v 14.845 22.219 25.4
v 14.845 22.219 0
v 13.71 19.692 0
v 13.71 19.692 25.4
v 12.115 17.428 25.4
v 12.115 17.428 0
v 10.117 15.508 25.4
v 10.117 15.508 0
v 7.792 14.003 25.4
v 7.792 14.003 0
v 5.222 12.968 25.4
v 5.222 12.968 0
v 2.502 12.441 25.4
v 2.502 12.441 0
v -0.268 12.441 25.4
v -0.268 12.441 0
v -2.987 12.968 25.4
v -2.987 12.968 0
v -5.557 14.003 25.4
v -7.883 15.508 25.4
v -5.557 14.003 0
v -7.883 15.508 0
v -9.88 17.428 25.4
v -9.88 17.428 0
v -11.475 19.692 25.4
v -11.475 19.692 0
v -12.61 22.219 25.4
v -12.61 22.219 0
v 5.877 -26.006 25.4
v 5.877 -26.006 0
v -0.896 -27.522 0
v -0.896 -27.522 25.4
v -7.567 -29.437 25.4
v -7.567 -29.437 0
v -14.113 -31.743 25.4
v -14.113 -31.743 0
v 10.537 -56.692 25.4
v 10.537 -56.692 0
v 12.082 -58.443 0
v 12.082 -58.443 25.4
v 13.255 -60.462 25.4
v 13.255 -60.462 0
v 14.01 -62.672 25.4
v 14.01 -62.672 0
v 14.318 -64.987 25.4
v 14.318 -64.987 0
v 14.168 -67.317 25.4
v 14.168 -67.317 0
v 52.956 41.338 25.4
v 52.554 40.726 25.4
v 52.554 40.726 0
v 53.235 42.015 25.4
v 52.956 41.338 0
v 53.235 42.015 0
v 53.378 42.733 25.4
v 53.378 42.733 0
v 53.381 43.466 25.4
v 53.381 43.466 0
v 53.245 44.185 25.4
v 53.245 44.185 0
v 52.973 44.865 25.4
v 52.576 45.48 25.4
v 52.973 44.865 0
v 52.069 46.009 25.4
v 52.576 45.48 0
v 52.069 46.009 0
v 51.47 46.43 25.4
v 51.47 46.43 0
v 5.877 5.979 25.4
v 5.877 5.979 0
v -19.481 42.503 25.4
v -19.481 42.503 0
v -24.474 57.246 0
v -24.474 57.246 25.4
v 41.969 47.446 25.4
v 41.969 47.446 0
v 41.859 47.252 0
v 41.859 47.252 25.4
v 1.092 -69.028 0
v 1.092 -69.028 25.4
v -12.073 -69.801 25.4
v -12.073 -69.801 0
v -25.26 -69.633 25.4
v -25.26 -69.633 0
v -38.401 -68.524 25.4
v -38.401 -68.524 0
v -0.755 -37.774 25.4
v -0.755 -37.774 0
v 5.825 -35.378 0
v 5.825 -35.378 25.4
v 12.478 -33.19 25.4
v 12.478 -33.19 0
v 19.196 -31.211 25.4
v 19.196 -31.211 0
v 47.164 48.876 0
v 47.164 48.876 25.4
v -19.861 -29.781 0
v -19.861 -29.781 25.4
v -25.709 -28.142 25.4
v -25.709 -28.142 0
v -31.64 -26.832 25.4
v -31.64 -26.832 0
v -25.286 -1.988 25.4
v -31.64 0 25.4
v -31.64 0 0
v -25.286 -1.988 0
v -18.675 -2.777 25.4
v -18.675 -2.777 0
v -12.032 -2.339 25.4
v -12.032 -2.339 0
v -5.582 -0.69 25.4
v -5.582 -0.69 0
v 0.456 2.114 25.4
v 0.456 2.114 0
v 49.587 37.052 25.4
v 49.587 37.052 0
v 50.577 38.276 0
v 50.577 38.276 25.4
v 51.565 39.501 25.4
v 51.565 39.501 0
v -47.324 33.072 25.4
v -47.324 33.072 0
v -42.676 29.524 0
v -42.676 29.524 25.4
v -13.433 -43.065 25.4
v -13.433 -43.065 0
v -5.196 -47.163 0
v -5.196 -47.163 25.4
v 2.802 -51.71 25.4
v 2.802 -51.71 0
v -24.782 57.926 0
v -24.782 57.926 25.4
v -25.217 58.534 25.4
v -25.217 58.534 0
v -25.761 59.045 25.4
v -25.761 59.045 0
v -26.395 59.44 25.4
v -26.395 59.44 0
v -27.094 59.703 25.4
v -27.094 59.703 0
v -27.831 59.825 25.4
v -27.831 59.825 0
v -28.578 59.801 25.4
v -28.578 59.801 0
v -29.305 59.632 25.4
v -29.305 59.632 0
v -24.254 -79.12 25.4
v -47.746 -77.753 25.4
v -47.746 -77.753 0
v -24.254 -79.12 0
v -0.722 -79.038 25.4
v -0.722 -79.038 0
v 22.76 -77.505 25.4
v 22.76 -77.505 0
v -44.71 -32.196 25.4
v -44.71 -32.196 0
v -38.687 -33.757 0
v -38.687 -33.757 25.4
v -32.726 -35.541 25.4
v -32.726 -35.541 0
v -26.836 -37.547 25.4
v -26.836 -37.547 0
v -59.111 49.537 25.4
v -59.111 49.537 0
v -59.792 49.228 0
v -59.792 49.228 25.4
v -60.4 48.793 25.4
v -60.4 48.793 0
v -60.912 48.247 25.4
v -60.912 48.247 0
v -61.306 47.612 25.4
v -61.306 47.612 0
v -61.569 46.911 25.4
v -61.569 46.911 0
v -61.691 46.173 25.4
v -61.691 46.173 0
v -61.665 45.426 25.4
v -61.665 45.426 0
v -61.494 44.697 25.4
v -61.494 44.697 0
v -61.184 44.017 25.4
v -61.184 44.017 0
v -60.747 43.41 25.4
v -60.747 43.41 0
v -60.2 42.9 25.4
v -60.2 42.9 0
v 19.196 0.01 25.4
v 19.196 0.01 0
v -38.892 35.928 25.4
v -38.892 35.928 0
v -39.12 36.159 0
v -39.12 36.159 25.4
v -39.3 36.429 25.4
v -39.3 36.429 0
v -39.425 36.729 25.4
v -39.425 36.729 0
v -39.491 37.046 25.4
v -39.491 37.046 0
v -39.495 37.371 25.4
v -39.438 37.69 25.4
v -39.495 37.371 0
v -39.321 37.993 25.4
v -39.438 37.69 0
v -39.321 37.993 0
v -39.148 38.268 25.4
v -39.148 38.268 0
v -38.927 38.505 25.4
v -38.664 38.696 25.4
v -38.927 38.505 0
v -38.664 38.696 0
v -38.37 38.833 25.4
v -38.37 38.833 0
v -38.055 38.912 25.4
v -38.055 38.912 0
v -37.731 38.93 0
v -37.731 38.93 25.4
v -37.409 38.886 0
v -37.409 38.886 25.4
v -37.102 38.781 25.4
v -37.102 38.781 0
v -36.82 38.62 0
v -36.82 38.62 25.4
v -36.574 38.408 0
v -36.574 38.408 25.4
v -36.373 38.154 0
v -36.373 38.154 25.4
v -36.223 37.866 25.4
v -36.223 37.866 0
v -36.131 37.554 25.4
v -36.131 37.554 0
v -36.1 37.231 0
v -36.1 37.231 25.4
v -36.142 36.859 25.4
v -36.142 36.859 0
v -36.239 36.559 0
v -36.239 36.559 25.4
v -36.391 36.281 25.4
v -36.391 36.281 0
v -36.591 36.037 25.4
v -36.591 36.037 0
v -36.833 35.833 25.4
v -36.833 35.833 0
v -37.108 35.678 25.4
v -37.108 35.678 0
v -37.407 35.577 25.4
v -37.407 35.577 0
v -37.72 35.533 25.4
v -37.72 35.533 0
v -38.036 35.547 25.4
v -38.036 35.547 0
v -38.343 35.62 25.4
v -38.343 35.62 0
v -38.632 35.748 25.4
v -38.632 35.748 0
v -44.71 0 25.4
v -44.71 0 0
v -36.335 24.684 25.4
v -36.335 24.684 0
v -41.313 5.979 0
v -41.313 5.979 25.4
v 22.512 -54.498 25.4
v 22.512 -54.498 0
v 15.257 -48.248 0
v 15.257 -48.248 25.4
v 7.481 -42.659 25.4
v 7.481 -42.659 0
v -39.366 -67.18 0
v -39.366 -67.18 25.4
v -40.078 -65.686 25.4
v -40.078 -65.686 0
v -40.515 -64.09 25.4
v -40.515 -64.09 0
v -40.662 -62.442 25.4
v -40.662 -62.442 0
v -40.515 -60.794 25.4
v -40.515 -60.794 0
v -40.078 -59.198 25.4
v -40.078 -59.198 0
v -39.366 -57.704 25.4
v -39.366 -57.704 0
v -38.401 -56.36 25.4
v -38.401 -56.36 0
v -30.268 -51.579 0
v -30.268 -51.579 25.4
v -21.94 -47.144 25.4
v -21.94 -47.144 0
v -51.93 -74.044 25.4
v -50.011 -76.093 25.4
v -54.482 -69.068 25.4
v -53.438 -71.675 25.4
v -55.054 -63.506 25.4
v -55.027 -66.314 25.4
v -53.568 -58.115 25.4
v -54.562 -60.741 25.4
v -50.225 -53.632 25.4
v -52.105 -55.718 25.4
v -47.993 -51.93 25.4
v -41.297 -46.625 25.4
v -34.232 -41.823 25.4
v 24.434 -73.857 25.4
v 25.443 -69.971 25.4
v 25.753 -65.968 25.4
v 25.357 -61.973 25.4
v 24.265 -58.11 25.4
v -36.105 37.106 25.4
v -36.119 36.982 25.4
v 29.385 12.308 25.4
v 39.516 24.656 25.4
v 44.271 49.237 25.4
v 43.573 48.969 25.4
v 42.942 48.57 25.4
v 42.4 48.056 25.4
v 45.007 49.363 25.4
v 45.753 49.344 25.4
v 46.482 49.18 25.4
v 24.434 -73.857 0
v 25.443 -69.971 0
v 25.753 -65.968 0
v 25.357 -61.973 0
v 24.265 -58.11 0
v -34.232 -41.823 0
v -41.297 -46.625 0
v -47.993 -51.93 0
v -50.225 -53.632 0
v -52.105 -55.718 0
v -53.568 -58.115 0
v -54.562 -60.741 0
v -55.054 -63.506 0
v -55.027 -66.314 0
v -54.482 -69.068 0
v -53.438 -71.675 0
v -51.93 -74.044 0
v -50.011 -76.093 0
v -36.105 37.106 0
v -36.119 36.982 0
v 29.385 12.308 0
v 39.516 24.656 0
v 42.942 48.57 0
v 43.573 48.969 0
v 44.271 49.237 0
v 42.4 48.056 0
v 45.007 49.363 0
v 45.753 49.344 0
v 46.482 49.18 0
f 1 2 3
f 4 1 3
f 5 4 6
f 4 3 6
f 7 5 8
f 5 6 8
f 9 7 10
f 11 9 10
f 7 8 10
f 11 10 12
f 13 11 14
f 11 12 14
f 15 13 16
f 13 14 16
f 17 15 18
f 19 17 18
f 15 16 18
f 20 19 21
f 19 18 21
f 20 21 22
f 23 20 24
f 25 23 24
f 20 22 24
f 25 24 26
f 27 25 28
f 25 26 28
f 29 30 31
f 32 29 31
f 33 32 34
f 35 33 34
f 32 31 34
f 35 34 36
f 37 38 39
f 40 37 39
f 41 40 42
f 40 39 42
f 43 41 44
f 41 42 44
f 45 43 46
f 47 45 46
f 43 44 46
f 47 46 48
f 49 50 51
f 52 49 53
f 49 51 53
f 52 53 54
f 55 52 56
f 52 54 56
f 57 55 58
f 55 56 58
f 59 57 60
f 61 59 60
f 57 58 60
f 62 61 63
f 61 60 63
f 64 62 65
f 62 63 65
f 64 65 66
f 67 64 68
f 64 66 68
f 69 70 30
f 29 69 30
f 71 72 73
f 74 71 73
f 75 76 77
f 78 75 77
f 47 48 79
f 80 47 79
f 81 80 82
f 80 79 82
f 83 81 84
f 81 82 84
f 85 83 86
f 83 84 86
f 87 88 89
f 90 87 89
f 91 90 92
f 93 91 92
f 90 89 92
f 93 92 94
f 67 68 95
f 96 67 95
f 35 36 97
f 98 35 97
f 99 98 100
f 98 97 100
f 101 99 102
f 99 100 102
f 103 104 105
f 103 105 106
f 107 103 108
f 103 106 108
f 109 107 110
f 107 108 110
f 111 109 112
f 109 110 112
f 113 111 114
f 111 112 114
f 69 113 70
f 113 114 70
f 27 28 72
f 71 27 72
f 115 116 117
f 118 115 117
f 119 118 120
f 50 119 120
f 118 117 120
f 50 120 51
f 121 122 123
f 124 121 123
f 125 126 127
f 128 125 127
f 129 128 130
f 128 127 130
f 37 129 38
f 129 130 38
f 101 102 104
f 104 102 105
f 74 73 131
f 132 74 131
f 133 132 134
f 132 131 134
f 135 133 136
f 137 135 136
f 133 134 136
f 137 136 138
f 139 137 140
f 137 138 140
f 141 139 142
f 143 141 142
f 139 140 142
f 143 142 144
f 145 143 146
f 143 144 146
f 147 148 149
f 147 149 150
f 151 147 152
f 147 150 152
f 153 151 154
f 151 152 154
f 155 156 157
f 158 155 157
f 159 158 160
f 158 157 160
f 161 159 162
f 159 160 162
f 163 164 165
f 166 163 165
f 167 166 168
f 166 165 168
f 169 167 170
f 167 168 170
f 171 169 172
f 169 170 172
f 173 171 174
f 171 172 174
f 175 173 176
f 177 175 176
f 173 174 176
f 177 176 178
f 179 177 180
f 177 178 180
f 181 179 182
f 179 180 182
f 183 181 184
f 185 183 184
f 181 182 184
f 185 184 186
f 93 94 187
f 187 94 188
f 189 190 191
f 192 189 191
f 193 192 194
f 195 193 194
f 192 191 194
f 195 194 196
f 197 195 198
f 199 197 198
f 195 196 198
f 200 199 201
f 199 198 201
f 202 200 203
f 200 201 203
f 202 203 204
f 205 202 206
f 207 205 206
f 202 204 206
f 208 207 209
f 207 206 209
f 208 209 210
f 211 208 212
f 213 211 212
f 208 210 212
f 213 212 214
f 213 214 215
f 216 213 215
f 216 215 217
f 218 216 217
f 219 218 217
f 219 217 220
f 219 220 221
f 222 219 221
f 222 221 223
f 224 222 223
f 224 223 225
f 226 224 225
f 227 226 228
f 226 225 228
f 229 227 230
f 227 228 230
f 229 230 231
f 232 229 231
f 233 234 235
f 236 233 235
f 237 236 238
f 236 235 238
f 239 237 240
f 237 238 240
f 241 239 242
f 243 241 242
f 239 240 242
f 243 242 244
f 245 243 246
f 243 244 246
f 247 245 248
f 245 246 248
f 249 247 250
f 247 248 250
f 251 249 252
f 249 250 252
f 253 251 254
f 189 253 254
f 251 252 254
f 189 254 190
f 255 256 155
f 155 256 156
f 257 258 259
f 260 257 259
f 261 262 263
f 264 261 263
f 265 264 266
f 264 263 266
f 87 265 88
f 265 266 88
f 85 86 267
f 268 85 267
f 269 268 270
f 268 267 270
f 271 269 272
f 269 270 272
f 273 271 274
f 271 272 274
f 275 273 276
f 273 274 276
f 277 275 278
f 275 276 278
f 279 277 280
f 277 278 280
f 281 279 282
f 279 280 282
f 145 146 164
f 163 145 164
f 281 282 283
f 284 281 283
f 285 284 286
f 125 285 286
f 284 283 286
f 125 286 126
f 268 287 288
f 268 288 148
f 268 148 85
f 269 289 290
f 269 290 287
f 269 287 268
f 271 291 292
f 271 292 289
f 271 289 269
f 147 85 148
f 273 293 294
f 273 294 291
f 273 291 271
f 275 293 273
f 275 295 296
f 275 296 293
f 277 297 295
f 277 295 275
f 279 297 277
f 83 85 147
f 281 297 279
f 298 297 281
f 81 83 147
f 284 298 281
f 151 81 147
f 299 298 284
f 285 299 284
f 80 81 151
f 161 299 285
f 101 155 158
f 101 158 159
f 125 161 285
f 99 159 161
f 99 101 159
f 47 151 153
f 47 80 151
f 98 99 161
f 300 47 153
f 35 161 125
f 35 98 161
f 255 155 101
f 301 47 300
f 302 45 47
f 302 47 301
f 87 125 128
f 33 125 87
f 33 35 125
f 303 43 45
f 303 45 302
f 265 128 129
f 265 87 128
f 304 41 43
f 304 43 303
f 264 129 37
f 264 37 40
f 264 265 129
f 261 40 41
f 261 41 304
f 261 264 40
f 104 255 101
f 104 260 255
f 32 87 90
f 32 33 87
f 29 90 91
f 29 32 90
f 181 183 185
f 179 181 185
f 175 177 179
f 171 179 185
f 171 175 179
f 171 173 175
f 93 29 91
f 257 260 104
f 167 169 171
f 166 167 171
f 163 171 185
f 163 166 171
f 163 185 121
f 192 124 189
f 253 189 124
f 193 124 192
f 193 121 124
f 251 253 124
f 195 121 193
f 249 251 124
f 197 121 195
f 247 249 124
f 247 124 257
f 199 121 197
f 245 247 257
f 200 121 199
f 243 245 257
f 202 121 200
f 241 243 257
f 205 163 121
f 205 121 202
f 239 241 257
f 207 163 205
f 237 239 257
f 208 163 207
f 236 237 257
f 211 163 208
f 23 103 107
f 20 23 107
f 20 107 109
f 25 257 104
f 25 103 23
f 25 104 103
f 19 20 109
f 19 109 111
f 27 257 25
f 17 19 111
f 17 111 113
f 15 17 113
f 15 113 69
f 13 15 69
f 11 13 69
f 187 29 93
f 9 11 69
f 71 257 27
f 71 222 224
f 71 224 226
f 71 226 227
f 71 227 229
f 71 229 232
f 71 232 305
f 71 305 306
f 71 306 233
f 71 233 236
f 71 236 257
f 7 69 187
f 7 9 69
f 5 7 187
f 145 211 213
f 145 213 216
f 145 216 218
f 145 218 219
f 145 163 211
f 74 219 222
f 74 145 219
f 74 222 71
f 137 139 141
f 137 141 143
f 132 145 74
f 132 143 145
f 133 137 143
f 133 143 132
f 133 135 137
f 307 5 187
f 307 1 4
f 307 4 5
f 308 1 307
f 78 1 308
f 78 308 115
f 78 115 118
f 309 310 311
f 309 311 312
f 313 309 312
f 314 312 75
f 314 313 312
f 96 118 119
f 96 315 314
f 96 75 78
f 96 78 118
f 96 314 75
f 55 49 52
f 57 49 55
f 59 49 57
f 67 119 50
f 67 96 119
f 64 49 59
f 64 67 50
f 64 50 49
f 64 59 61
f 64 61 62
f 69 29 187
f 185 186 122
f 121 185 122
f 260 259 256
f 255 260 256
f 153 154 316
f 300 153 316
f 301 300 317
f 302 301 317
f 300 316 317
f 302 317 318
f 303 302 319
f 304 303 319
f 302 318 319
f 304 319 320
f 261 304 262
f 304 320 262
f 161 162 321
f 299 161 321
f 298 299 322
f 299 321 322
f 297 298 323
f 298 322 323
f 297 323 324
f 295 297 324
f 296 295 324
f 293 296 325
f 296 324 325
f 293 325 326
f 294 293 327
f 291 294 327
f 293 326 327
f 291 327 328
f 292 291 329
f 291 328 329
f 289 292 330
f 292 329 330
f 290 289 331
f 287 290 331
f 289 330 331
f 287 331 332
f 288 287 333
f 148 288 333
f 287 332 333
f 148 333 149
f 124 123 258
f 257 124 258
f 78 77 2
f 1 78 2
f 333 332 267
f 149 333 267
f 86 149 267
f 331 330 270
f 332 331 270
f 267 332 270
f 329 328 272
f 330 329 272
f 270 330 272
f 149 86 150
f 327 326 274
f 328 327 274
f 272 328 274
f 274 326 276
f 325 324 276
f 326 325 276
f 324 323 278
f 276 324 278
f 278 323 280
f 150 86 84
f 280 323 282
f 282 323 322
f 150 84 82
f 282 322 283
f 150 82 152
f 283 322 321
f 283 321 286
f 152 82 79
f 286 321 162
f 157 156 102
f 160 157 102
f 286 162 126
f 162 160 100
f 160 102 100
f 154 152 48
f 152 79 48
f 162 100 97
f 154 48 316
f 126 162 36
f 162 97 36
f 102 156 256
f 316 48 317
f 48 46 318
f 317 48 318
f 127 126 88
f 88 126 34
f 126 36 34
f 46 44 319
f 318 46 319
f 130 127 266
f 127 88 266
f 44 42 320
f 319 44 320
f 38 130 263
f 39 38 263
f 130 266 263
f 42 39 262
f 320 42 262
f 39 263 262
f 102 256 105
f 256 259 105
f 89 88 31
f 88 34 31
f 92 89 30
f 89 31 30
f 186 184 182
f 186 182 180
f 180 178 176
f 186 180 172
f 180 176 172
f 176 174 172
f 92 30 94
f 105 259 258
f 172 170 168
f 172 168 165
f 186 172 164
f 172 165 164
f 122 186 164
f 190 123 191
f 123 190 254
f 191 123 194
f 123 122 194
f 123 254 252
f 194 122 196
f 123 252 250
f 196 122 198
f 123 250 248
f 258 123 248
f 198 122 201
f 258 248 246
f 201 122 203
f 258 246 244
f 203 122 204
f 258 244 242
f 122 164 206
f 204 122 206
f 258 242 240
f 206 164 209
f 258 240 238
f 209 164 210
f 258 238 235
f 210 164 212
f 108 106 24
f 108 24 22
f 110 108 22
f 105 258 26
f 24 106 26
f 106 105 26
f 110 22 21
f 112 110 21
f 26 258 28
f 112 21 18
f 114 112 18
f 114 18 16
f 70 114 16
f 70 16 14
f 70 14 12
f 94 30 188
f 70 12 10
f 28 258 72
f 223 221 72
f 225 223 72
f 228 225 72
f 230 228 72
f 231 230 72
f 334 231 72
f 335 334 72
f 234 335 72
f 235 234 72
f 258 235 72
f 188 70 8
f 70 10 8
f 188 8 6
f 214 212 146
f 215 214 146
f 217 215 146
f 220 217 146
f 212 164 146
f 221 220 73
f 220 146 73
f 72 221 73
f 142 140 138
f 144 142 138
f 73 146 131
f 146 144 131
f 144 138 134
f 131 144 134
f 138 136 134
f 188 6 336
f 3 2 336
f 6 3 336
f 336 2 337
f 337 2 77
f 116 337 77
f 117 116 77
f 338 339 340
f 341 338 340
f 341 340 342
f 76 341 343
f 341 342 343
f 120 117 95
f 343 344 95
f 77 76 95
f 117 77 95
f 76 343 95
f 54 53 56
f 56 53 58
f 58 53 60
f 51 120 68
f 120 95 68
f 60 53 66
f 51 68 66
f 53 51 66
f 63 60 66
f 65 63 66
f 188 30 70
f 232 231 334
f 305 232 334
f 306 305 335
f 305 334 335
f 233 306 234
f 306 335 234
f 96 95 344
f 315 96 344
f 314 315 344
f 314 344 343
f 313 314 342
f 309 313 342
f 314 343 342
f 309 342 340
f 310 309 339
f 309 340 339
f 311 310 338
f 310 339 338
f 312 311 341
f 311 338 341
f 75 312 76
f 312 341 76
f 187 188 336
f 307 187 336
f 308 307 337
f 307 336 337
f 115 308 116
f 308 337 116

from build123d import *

# Parameters (mm, degrees)
F1_DEPTH = 25.4


with BuildPart() as f1:
    # F0 (on Top) → F1 (new body)
    with BuildSketch(Plane.XY):
        with BuildLine():
            ThreePointArc((-59.1107523799, 49.5368446501), (-61.6481766526, 46.5452847002), (-60.2000903929, 42.8996024515))
            Line((-60.2000903929, 42.8996024515), (-47.3238480687, 33.0717364155))
            Line((-47.3238480687, 33.0717364155), (-38.8923999974, 35.9275490176))
            ThreePointArc((-38.8923999974, 35.9275490176), (-38.5200626671, 38.7717193747), (-36.1004724001, 37.2310951352))
            ThreePointArc((-36.1004724001, 37.2310951352), (-36.1107927824, 37.0440430671), (-36.1416286435, 36.8592617474))
            Line((-36.1416286435, 36.8592617474), (-19.4805414172, 42.5025323296))
            Line((-19.4805414172, 42.5025323296), (-24.4742741518, 57.2459360816))
            ThreePointArc((-24.4742741518, 57.2459360816), (-26.3954934154, 59.4396204364), (-29.3051696679, 59.6322823499))
            Line((-29.3051696679, 59.6322823499), (-59.1107523799, 49.5368446501))
        make_face()
        with BuildLine():
            Line((-38.8923999974, 35.9275490176), (-47.3238480687, 33.0717364155))
            Line((-47.3238480687, 33.0717364155), (-42.6756189918, 29.5239488295))
            Line((-42.6756189918, 29.5239488295), (-17.9241616526, 37.907505627))
            Line((-17.9241616526, 37.907505627), (-19.4805414172, 42.5025323296))
            Line((-19.4805414172, 42.5025323296), (-36.1416286435, 36.8592617474))
            ThreePointArc((-36.1416286435, 36.8592617474), (-37.2552876391, 35.6206883909), (-38.8923999974, 35.9275490176))
        make_face()
        with BuildLine():
            Line((-17.9241616526, 37.907505627), (-42.6756189918, 29.5239488295))
            Line((-42.6756189918, 29.5239488295), (-36.3345149505, 24.6840646871))
            Line((-36.3345149505, 24.6840646871), (-41.3134286256, 5.9786473972))
            ThreePointArc((-41.3134286256, 5.9786473972), (-36.7132008564, 2.606335405), (-31.6395828713, 0))
            ThreePointArc((-31.6395828713, 0), (-12.0320170539, -2.3394482542), (5.8771688615, 5.9786473972))
            Line((5.8771688615, 5.9786473972), (19.1956014543, 0.00967121))
            ThreePointArc((19.1956014543, 0.00967121), (34.4581492923, 18.4761157552), (49.587438224, 37.0518945294))
            Line((49.587438224, 37.0518945294), (41.8655847635, 41.4393103907))
            Line((41.8655847635, 41.4393103907), (38.9125214018, 43.117186965))
            Line((38.9125214018, 43.1171869651), (41.8593864064, 47.2519499851))
            Line((41.8593864064, 47.2519499851), (14.8451968214, 22.2191433988))
            ThreePointArc((14.8451968214, 22.2191433988), (1.1174172166, 12.3750160433), (-12.6103623883, 22.2191433988))
            Line((-12.6103623883, 22.2191433988), (-17.9241616526, 37.907505627))
        make_face()
        with BuildLine():
            ThreePointArc((-31.6395828713, 0), (-36.7132008564, 2.606335405), (-41.3134286256, 5.9786473972))
            Line((-41.3134286256, 5.9786473972), (-44.7103866945, 0))
            Line((-44.7103866945, 0), (-44.7103866945, -32.1961882046))
            ThreePointArc((-44.7103866945, -32.1961882046), (-35.6981979706, -34.6212321144), (-26.8360574654, -37.5474667641))
            ThreePointArc((-26.8360574654, -37.5474667641), (-20.5610394294, -34.4552816286), (-14.112735744, -31.7429321219))
            ThreePointArc((-14.112735744, -31.7429321219), (-22.7734524474, -28.9208943273), (-31.6395828713, -26.8319610022))
            Line((-31.6395828713, -26.8319610022), (-31.6395828713, 0))
        make_face()
        with BuildLine():
            Line((19.1956014543, 0.00967121), (5.8771688615, 5.9786473972))
            Line((5.8771688615, 5.9786473972), (5.8771688615, -26.0057745091))
            ThreePointArc((5.8771688615, -26.0057745091), (-4.2452726756, -28.4301442134), (-14.112735744, -31.7429321219))
            ThreePointArc((-14.112735744, -31.7429321219), (-7.332536937, -34.533476308), (-0.7553169871, -37.7736013745))
            ThreePointArc((-0.7553169871, -37.7736013745), (9.143147591, -34.2583484987), (19.1956014543, -31.2112556035))
            Line((19.1956014543, -31.2112556035), (19.1956014543, 0.00967121))
        make_face()
        Polygon((41.9694184521, 47.4456064242), (41.8593864064, 47.2519499851), (38.9125214018, 43.1171869651), (41.8655847635, 41.4393103907), (45.162112145, 45.4186524008), align=None)
        with BuildLine():
            ThreePointArc((-0.7553169871, -37.7736013745), (-7.332536937, -34.533476308), (-14.112735744, -31.7429321219))
            ThreePointArc((-14.112735744, -31.7429321219), (-20.5610394294, -34.4552816286), (-26.8360574654, -37.5474667641))
            ThreePointArc((-26.8360574654, -37.5474667641), (-20.074389371, -40.1601770998), (-13.4328625364, -43.064747984))
            ThreePointArc((-13.4328625364, -43.064747984), (-7.1346825518, -40.3219146743), (-0.7553169871, -37.7736013745))
        make_face()
        with BuildLine():
            ThreePointArc((-13.4328625364, -43.064747984), (-20.074389371, -40.1601770998), (-26.8360574654, -37.5474667641))
            ThreePointArc((-26.8360574654, -37.5474667641), (-37.8079228806, -44.1596970981), (-47.9927124606, -51.9297345425))
            ThreePointArc((-47.9927124606, -51.9297345425), (-55.1060167541, -64.9103960311), (-47.7461889386, -77.7528882027))
            ThreePointArc((-47.7461889386, -77.7528882027), (-12.4874489881, -79.2604436558), (22.7598436177, -77.5054991245))
            ThreePointArc((22.7598436177, -77.5054991245), (25.753425112, -65.9683634877), (22.5124526769, -54.4982664287))
            ThreePointArc((22.5124526769, -54.4982664287), (11.4306480238, -45.3678662365), (-0.7553169871, -37.7736013745))
            ThreePointArc((-0.7553169871, -37.7736013745), (-7.1346825518, -40.3219146743), (-13.4328625364, -43.064747984))
        make_face()
        with BuildLine():
            ThreePointArc((-38.401431896, -56.3598381515), (-26.127337959, -49.3175486866), (-13.4328625364, -43.064747984))
            ThreePointArc((-13.4328625364, -43.064747984), (-1.1655138535, -49.3811780371), (10.536660869, -56.691734725))
            ThreePointArc((10.536660869, -56.691734725), (13.6866926882, -61.5483388363), (14.1682401614, -67.3169969113))
            ThreePointArc((14.1682401614, -67.3169969113), (-12.073405036, -69.8014865929), (-38.401431896, -68.5241325674))
            ThreePointArc((-38.401431896, -68.5241325674), (-40.6616602948, -62.4419853594), (-38.401431896, -56.3598381515))
        make_face(mode=Mode.SUBTRACT)
        with BuildLine():
            ThreePointArc((47.1642236558, 48.8760605112), (44.2705643123, 49.2367128523), (41.9694184521, 47.4456064242))
            Line((41.9694184521, 47.4456064242), (45.162112145, 45.4186524008))
            Line((45.162112145, 45.4186524008), (52.5536226058, 40.7259842943))
            ThreePointArc((52.5536226058, 40.7259842943), (53.3304416036, 43.828541799), (51.4696137823, 46.4298166105))
            Line((51.4696137823, 46.4298166105), (47.1642236558, 48.8760605112))
        make_face()
        with BuildLine():
            Line((41.8655847635, 41.4393103907), (49.587438224, 37.0518945294))
            ThreePointArc((49.587438224, 37.0518945294), (51.0711817018, 38.8884136117), (52.5536226058, 40.7259842943))
            Line((52.5536226058, 40.7259842943), (45.162112145, 45.4186524008))
            Line((45.162112145, 45.4186524008), (41.8655847635, 41.4393103907))
        make_face()
    extrude(amount=F1_DEPTH)


solid = f1.part
